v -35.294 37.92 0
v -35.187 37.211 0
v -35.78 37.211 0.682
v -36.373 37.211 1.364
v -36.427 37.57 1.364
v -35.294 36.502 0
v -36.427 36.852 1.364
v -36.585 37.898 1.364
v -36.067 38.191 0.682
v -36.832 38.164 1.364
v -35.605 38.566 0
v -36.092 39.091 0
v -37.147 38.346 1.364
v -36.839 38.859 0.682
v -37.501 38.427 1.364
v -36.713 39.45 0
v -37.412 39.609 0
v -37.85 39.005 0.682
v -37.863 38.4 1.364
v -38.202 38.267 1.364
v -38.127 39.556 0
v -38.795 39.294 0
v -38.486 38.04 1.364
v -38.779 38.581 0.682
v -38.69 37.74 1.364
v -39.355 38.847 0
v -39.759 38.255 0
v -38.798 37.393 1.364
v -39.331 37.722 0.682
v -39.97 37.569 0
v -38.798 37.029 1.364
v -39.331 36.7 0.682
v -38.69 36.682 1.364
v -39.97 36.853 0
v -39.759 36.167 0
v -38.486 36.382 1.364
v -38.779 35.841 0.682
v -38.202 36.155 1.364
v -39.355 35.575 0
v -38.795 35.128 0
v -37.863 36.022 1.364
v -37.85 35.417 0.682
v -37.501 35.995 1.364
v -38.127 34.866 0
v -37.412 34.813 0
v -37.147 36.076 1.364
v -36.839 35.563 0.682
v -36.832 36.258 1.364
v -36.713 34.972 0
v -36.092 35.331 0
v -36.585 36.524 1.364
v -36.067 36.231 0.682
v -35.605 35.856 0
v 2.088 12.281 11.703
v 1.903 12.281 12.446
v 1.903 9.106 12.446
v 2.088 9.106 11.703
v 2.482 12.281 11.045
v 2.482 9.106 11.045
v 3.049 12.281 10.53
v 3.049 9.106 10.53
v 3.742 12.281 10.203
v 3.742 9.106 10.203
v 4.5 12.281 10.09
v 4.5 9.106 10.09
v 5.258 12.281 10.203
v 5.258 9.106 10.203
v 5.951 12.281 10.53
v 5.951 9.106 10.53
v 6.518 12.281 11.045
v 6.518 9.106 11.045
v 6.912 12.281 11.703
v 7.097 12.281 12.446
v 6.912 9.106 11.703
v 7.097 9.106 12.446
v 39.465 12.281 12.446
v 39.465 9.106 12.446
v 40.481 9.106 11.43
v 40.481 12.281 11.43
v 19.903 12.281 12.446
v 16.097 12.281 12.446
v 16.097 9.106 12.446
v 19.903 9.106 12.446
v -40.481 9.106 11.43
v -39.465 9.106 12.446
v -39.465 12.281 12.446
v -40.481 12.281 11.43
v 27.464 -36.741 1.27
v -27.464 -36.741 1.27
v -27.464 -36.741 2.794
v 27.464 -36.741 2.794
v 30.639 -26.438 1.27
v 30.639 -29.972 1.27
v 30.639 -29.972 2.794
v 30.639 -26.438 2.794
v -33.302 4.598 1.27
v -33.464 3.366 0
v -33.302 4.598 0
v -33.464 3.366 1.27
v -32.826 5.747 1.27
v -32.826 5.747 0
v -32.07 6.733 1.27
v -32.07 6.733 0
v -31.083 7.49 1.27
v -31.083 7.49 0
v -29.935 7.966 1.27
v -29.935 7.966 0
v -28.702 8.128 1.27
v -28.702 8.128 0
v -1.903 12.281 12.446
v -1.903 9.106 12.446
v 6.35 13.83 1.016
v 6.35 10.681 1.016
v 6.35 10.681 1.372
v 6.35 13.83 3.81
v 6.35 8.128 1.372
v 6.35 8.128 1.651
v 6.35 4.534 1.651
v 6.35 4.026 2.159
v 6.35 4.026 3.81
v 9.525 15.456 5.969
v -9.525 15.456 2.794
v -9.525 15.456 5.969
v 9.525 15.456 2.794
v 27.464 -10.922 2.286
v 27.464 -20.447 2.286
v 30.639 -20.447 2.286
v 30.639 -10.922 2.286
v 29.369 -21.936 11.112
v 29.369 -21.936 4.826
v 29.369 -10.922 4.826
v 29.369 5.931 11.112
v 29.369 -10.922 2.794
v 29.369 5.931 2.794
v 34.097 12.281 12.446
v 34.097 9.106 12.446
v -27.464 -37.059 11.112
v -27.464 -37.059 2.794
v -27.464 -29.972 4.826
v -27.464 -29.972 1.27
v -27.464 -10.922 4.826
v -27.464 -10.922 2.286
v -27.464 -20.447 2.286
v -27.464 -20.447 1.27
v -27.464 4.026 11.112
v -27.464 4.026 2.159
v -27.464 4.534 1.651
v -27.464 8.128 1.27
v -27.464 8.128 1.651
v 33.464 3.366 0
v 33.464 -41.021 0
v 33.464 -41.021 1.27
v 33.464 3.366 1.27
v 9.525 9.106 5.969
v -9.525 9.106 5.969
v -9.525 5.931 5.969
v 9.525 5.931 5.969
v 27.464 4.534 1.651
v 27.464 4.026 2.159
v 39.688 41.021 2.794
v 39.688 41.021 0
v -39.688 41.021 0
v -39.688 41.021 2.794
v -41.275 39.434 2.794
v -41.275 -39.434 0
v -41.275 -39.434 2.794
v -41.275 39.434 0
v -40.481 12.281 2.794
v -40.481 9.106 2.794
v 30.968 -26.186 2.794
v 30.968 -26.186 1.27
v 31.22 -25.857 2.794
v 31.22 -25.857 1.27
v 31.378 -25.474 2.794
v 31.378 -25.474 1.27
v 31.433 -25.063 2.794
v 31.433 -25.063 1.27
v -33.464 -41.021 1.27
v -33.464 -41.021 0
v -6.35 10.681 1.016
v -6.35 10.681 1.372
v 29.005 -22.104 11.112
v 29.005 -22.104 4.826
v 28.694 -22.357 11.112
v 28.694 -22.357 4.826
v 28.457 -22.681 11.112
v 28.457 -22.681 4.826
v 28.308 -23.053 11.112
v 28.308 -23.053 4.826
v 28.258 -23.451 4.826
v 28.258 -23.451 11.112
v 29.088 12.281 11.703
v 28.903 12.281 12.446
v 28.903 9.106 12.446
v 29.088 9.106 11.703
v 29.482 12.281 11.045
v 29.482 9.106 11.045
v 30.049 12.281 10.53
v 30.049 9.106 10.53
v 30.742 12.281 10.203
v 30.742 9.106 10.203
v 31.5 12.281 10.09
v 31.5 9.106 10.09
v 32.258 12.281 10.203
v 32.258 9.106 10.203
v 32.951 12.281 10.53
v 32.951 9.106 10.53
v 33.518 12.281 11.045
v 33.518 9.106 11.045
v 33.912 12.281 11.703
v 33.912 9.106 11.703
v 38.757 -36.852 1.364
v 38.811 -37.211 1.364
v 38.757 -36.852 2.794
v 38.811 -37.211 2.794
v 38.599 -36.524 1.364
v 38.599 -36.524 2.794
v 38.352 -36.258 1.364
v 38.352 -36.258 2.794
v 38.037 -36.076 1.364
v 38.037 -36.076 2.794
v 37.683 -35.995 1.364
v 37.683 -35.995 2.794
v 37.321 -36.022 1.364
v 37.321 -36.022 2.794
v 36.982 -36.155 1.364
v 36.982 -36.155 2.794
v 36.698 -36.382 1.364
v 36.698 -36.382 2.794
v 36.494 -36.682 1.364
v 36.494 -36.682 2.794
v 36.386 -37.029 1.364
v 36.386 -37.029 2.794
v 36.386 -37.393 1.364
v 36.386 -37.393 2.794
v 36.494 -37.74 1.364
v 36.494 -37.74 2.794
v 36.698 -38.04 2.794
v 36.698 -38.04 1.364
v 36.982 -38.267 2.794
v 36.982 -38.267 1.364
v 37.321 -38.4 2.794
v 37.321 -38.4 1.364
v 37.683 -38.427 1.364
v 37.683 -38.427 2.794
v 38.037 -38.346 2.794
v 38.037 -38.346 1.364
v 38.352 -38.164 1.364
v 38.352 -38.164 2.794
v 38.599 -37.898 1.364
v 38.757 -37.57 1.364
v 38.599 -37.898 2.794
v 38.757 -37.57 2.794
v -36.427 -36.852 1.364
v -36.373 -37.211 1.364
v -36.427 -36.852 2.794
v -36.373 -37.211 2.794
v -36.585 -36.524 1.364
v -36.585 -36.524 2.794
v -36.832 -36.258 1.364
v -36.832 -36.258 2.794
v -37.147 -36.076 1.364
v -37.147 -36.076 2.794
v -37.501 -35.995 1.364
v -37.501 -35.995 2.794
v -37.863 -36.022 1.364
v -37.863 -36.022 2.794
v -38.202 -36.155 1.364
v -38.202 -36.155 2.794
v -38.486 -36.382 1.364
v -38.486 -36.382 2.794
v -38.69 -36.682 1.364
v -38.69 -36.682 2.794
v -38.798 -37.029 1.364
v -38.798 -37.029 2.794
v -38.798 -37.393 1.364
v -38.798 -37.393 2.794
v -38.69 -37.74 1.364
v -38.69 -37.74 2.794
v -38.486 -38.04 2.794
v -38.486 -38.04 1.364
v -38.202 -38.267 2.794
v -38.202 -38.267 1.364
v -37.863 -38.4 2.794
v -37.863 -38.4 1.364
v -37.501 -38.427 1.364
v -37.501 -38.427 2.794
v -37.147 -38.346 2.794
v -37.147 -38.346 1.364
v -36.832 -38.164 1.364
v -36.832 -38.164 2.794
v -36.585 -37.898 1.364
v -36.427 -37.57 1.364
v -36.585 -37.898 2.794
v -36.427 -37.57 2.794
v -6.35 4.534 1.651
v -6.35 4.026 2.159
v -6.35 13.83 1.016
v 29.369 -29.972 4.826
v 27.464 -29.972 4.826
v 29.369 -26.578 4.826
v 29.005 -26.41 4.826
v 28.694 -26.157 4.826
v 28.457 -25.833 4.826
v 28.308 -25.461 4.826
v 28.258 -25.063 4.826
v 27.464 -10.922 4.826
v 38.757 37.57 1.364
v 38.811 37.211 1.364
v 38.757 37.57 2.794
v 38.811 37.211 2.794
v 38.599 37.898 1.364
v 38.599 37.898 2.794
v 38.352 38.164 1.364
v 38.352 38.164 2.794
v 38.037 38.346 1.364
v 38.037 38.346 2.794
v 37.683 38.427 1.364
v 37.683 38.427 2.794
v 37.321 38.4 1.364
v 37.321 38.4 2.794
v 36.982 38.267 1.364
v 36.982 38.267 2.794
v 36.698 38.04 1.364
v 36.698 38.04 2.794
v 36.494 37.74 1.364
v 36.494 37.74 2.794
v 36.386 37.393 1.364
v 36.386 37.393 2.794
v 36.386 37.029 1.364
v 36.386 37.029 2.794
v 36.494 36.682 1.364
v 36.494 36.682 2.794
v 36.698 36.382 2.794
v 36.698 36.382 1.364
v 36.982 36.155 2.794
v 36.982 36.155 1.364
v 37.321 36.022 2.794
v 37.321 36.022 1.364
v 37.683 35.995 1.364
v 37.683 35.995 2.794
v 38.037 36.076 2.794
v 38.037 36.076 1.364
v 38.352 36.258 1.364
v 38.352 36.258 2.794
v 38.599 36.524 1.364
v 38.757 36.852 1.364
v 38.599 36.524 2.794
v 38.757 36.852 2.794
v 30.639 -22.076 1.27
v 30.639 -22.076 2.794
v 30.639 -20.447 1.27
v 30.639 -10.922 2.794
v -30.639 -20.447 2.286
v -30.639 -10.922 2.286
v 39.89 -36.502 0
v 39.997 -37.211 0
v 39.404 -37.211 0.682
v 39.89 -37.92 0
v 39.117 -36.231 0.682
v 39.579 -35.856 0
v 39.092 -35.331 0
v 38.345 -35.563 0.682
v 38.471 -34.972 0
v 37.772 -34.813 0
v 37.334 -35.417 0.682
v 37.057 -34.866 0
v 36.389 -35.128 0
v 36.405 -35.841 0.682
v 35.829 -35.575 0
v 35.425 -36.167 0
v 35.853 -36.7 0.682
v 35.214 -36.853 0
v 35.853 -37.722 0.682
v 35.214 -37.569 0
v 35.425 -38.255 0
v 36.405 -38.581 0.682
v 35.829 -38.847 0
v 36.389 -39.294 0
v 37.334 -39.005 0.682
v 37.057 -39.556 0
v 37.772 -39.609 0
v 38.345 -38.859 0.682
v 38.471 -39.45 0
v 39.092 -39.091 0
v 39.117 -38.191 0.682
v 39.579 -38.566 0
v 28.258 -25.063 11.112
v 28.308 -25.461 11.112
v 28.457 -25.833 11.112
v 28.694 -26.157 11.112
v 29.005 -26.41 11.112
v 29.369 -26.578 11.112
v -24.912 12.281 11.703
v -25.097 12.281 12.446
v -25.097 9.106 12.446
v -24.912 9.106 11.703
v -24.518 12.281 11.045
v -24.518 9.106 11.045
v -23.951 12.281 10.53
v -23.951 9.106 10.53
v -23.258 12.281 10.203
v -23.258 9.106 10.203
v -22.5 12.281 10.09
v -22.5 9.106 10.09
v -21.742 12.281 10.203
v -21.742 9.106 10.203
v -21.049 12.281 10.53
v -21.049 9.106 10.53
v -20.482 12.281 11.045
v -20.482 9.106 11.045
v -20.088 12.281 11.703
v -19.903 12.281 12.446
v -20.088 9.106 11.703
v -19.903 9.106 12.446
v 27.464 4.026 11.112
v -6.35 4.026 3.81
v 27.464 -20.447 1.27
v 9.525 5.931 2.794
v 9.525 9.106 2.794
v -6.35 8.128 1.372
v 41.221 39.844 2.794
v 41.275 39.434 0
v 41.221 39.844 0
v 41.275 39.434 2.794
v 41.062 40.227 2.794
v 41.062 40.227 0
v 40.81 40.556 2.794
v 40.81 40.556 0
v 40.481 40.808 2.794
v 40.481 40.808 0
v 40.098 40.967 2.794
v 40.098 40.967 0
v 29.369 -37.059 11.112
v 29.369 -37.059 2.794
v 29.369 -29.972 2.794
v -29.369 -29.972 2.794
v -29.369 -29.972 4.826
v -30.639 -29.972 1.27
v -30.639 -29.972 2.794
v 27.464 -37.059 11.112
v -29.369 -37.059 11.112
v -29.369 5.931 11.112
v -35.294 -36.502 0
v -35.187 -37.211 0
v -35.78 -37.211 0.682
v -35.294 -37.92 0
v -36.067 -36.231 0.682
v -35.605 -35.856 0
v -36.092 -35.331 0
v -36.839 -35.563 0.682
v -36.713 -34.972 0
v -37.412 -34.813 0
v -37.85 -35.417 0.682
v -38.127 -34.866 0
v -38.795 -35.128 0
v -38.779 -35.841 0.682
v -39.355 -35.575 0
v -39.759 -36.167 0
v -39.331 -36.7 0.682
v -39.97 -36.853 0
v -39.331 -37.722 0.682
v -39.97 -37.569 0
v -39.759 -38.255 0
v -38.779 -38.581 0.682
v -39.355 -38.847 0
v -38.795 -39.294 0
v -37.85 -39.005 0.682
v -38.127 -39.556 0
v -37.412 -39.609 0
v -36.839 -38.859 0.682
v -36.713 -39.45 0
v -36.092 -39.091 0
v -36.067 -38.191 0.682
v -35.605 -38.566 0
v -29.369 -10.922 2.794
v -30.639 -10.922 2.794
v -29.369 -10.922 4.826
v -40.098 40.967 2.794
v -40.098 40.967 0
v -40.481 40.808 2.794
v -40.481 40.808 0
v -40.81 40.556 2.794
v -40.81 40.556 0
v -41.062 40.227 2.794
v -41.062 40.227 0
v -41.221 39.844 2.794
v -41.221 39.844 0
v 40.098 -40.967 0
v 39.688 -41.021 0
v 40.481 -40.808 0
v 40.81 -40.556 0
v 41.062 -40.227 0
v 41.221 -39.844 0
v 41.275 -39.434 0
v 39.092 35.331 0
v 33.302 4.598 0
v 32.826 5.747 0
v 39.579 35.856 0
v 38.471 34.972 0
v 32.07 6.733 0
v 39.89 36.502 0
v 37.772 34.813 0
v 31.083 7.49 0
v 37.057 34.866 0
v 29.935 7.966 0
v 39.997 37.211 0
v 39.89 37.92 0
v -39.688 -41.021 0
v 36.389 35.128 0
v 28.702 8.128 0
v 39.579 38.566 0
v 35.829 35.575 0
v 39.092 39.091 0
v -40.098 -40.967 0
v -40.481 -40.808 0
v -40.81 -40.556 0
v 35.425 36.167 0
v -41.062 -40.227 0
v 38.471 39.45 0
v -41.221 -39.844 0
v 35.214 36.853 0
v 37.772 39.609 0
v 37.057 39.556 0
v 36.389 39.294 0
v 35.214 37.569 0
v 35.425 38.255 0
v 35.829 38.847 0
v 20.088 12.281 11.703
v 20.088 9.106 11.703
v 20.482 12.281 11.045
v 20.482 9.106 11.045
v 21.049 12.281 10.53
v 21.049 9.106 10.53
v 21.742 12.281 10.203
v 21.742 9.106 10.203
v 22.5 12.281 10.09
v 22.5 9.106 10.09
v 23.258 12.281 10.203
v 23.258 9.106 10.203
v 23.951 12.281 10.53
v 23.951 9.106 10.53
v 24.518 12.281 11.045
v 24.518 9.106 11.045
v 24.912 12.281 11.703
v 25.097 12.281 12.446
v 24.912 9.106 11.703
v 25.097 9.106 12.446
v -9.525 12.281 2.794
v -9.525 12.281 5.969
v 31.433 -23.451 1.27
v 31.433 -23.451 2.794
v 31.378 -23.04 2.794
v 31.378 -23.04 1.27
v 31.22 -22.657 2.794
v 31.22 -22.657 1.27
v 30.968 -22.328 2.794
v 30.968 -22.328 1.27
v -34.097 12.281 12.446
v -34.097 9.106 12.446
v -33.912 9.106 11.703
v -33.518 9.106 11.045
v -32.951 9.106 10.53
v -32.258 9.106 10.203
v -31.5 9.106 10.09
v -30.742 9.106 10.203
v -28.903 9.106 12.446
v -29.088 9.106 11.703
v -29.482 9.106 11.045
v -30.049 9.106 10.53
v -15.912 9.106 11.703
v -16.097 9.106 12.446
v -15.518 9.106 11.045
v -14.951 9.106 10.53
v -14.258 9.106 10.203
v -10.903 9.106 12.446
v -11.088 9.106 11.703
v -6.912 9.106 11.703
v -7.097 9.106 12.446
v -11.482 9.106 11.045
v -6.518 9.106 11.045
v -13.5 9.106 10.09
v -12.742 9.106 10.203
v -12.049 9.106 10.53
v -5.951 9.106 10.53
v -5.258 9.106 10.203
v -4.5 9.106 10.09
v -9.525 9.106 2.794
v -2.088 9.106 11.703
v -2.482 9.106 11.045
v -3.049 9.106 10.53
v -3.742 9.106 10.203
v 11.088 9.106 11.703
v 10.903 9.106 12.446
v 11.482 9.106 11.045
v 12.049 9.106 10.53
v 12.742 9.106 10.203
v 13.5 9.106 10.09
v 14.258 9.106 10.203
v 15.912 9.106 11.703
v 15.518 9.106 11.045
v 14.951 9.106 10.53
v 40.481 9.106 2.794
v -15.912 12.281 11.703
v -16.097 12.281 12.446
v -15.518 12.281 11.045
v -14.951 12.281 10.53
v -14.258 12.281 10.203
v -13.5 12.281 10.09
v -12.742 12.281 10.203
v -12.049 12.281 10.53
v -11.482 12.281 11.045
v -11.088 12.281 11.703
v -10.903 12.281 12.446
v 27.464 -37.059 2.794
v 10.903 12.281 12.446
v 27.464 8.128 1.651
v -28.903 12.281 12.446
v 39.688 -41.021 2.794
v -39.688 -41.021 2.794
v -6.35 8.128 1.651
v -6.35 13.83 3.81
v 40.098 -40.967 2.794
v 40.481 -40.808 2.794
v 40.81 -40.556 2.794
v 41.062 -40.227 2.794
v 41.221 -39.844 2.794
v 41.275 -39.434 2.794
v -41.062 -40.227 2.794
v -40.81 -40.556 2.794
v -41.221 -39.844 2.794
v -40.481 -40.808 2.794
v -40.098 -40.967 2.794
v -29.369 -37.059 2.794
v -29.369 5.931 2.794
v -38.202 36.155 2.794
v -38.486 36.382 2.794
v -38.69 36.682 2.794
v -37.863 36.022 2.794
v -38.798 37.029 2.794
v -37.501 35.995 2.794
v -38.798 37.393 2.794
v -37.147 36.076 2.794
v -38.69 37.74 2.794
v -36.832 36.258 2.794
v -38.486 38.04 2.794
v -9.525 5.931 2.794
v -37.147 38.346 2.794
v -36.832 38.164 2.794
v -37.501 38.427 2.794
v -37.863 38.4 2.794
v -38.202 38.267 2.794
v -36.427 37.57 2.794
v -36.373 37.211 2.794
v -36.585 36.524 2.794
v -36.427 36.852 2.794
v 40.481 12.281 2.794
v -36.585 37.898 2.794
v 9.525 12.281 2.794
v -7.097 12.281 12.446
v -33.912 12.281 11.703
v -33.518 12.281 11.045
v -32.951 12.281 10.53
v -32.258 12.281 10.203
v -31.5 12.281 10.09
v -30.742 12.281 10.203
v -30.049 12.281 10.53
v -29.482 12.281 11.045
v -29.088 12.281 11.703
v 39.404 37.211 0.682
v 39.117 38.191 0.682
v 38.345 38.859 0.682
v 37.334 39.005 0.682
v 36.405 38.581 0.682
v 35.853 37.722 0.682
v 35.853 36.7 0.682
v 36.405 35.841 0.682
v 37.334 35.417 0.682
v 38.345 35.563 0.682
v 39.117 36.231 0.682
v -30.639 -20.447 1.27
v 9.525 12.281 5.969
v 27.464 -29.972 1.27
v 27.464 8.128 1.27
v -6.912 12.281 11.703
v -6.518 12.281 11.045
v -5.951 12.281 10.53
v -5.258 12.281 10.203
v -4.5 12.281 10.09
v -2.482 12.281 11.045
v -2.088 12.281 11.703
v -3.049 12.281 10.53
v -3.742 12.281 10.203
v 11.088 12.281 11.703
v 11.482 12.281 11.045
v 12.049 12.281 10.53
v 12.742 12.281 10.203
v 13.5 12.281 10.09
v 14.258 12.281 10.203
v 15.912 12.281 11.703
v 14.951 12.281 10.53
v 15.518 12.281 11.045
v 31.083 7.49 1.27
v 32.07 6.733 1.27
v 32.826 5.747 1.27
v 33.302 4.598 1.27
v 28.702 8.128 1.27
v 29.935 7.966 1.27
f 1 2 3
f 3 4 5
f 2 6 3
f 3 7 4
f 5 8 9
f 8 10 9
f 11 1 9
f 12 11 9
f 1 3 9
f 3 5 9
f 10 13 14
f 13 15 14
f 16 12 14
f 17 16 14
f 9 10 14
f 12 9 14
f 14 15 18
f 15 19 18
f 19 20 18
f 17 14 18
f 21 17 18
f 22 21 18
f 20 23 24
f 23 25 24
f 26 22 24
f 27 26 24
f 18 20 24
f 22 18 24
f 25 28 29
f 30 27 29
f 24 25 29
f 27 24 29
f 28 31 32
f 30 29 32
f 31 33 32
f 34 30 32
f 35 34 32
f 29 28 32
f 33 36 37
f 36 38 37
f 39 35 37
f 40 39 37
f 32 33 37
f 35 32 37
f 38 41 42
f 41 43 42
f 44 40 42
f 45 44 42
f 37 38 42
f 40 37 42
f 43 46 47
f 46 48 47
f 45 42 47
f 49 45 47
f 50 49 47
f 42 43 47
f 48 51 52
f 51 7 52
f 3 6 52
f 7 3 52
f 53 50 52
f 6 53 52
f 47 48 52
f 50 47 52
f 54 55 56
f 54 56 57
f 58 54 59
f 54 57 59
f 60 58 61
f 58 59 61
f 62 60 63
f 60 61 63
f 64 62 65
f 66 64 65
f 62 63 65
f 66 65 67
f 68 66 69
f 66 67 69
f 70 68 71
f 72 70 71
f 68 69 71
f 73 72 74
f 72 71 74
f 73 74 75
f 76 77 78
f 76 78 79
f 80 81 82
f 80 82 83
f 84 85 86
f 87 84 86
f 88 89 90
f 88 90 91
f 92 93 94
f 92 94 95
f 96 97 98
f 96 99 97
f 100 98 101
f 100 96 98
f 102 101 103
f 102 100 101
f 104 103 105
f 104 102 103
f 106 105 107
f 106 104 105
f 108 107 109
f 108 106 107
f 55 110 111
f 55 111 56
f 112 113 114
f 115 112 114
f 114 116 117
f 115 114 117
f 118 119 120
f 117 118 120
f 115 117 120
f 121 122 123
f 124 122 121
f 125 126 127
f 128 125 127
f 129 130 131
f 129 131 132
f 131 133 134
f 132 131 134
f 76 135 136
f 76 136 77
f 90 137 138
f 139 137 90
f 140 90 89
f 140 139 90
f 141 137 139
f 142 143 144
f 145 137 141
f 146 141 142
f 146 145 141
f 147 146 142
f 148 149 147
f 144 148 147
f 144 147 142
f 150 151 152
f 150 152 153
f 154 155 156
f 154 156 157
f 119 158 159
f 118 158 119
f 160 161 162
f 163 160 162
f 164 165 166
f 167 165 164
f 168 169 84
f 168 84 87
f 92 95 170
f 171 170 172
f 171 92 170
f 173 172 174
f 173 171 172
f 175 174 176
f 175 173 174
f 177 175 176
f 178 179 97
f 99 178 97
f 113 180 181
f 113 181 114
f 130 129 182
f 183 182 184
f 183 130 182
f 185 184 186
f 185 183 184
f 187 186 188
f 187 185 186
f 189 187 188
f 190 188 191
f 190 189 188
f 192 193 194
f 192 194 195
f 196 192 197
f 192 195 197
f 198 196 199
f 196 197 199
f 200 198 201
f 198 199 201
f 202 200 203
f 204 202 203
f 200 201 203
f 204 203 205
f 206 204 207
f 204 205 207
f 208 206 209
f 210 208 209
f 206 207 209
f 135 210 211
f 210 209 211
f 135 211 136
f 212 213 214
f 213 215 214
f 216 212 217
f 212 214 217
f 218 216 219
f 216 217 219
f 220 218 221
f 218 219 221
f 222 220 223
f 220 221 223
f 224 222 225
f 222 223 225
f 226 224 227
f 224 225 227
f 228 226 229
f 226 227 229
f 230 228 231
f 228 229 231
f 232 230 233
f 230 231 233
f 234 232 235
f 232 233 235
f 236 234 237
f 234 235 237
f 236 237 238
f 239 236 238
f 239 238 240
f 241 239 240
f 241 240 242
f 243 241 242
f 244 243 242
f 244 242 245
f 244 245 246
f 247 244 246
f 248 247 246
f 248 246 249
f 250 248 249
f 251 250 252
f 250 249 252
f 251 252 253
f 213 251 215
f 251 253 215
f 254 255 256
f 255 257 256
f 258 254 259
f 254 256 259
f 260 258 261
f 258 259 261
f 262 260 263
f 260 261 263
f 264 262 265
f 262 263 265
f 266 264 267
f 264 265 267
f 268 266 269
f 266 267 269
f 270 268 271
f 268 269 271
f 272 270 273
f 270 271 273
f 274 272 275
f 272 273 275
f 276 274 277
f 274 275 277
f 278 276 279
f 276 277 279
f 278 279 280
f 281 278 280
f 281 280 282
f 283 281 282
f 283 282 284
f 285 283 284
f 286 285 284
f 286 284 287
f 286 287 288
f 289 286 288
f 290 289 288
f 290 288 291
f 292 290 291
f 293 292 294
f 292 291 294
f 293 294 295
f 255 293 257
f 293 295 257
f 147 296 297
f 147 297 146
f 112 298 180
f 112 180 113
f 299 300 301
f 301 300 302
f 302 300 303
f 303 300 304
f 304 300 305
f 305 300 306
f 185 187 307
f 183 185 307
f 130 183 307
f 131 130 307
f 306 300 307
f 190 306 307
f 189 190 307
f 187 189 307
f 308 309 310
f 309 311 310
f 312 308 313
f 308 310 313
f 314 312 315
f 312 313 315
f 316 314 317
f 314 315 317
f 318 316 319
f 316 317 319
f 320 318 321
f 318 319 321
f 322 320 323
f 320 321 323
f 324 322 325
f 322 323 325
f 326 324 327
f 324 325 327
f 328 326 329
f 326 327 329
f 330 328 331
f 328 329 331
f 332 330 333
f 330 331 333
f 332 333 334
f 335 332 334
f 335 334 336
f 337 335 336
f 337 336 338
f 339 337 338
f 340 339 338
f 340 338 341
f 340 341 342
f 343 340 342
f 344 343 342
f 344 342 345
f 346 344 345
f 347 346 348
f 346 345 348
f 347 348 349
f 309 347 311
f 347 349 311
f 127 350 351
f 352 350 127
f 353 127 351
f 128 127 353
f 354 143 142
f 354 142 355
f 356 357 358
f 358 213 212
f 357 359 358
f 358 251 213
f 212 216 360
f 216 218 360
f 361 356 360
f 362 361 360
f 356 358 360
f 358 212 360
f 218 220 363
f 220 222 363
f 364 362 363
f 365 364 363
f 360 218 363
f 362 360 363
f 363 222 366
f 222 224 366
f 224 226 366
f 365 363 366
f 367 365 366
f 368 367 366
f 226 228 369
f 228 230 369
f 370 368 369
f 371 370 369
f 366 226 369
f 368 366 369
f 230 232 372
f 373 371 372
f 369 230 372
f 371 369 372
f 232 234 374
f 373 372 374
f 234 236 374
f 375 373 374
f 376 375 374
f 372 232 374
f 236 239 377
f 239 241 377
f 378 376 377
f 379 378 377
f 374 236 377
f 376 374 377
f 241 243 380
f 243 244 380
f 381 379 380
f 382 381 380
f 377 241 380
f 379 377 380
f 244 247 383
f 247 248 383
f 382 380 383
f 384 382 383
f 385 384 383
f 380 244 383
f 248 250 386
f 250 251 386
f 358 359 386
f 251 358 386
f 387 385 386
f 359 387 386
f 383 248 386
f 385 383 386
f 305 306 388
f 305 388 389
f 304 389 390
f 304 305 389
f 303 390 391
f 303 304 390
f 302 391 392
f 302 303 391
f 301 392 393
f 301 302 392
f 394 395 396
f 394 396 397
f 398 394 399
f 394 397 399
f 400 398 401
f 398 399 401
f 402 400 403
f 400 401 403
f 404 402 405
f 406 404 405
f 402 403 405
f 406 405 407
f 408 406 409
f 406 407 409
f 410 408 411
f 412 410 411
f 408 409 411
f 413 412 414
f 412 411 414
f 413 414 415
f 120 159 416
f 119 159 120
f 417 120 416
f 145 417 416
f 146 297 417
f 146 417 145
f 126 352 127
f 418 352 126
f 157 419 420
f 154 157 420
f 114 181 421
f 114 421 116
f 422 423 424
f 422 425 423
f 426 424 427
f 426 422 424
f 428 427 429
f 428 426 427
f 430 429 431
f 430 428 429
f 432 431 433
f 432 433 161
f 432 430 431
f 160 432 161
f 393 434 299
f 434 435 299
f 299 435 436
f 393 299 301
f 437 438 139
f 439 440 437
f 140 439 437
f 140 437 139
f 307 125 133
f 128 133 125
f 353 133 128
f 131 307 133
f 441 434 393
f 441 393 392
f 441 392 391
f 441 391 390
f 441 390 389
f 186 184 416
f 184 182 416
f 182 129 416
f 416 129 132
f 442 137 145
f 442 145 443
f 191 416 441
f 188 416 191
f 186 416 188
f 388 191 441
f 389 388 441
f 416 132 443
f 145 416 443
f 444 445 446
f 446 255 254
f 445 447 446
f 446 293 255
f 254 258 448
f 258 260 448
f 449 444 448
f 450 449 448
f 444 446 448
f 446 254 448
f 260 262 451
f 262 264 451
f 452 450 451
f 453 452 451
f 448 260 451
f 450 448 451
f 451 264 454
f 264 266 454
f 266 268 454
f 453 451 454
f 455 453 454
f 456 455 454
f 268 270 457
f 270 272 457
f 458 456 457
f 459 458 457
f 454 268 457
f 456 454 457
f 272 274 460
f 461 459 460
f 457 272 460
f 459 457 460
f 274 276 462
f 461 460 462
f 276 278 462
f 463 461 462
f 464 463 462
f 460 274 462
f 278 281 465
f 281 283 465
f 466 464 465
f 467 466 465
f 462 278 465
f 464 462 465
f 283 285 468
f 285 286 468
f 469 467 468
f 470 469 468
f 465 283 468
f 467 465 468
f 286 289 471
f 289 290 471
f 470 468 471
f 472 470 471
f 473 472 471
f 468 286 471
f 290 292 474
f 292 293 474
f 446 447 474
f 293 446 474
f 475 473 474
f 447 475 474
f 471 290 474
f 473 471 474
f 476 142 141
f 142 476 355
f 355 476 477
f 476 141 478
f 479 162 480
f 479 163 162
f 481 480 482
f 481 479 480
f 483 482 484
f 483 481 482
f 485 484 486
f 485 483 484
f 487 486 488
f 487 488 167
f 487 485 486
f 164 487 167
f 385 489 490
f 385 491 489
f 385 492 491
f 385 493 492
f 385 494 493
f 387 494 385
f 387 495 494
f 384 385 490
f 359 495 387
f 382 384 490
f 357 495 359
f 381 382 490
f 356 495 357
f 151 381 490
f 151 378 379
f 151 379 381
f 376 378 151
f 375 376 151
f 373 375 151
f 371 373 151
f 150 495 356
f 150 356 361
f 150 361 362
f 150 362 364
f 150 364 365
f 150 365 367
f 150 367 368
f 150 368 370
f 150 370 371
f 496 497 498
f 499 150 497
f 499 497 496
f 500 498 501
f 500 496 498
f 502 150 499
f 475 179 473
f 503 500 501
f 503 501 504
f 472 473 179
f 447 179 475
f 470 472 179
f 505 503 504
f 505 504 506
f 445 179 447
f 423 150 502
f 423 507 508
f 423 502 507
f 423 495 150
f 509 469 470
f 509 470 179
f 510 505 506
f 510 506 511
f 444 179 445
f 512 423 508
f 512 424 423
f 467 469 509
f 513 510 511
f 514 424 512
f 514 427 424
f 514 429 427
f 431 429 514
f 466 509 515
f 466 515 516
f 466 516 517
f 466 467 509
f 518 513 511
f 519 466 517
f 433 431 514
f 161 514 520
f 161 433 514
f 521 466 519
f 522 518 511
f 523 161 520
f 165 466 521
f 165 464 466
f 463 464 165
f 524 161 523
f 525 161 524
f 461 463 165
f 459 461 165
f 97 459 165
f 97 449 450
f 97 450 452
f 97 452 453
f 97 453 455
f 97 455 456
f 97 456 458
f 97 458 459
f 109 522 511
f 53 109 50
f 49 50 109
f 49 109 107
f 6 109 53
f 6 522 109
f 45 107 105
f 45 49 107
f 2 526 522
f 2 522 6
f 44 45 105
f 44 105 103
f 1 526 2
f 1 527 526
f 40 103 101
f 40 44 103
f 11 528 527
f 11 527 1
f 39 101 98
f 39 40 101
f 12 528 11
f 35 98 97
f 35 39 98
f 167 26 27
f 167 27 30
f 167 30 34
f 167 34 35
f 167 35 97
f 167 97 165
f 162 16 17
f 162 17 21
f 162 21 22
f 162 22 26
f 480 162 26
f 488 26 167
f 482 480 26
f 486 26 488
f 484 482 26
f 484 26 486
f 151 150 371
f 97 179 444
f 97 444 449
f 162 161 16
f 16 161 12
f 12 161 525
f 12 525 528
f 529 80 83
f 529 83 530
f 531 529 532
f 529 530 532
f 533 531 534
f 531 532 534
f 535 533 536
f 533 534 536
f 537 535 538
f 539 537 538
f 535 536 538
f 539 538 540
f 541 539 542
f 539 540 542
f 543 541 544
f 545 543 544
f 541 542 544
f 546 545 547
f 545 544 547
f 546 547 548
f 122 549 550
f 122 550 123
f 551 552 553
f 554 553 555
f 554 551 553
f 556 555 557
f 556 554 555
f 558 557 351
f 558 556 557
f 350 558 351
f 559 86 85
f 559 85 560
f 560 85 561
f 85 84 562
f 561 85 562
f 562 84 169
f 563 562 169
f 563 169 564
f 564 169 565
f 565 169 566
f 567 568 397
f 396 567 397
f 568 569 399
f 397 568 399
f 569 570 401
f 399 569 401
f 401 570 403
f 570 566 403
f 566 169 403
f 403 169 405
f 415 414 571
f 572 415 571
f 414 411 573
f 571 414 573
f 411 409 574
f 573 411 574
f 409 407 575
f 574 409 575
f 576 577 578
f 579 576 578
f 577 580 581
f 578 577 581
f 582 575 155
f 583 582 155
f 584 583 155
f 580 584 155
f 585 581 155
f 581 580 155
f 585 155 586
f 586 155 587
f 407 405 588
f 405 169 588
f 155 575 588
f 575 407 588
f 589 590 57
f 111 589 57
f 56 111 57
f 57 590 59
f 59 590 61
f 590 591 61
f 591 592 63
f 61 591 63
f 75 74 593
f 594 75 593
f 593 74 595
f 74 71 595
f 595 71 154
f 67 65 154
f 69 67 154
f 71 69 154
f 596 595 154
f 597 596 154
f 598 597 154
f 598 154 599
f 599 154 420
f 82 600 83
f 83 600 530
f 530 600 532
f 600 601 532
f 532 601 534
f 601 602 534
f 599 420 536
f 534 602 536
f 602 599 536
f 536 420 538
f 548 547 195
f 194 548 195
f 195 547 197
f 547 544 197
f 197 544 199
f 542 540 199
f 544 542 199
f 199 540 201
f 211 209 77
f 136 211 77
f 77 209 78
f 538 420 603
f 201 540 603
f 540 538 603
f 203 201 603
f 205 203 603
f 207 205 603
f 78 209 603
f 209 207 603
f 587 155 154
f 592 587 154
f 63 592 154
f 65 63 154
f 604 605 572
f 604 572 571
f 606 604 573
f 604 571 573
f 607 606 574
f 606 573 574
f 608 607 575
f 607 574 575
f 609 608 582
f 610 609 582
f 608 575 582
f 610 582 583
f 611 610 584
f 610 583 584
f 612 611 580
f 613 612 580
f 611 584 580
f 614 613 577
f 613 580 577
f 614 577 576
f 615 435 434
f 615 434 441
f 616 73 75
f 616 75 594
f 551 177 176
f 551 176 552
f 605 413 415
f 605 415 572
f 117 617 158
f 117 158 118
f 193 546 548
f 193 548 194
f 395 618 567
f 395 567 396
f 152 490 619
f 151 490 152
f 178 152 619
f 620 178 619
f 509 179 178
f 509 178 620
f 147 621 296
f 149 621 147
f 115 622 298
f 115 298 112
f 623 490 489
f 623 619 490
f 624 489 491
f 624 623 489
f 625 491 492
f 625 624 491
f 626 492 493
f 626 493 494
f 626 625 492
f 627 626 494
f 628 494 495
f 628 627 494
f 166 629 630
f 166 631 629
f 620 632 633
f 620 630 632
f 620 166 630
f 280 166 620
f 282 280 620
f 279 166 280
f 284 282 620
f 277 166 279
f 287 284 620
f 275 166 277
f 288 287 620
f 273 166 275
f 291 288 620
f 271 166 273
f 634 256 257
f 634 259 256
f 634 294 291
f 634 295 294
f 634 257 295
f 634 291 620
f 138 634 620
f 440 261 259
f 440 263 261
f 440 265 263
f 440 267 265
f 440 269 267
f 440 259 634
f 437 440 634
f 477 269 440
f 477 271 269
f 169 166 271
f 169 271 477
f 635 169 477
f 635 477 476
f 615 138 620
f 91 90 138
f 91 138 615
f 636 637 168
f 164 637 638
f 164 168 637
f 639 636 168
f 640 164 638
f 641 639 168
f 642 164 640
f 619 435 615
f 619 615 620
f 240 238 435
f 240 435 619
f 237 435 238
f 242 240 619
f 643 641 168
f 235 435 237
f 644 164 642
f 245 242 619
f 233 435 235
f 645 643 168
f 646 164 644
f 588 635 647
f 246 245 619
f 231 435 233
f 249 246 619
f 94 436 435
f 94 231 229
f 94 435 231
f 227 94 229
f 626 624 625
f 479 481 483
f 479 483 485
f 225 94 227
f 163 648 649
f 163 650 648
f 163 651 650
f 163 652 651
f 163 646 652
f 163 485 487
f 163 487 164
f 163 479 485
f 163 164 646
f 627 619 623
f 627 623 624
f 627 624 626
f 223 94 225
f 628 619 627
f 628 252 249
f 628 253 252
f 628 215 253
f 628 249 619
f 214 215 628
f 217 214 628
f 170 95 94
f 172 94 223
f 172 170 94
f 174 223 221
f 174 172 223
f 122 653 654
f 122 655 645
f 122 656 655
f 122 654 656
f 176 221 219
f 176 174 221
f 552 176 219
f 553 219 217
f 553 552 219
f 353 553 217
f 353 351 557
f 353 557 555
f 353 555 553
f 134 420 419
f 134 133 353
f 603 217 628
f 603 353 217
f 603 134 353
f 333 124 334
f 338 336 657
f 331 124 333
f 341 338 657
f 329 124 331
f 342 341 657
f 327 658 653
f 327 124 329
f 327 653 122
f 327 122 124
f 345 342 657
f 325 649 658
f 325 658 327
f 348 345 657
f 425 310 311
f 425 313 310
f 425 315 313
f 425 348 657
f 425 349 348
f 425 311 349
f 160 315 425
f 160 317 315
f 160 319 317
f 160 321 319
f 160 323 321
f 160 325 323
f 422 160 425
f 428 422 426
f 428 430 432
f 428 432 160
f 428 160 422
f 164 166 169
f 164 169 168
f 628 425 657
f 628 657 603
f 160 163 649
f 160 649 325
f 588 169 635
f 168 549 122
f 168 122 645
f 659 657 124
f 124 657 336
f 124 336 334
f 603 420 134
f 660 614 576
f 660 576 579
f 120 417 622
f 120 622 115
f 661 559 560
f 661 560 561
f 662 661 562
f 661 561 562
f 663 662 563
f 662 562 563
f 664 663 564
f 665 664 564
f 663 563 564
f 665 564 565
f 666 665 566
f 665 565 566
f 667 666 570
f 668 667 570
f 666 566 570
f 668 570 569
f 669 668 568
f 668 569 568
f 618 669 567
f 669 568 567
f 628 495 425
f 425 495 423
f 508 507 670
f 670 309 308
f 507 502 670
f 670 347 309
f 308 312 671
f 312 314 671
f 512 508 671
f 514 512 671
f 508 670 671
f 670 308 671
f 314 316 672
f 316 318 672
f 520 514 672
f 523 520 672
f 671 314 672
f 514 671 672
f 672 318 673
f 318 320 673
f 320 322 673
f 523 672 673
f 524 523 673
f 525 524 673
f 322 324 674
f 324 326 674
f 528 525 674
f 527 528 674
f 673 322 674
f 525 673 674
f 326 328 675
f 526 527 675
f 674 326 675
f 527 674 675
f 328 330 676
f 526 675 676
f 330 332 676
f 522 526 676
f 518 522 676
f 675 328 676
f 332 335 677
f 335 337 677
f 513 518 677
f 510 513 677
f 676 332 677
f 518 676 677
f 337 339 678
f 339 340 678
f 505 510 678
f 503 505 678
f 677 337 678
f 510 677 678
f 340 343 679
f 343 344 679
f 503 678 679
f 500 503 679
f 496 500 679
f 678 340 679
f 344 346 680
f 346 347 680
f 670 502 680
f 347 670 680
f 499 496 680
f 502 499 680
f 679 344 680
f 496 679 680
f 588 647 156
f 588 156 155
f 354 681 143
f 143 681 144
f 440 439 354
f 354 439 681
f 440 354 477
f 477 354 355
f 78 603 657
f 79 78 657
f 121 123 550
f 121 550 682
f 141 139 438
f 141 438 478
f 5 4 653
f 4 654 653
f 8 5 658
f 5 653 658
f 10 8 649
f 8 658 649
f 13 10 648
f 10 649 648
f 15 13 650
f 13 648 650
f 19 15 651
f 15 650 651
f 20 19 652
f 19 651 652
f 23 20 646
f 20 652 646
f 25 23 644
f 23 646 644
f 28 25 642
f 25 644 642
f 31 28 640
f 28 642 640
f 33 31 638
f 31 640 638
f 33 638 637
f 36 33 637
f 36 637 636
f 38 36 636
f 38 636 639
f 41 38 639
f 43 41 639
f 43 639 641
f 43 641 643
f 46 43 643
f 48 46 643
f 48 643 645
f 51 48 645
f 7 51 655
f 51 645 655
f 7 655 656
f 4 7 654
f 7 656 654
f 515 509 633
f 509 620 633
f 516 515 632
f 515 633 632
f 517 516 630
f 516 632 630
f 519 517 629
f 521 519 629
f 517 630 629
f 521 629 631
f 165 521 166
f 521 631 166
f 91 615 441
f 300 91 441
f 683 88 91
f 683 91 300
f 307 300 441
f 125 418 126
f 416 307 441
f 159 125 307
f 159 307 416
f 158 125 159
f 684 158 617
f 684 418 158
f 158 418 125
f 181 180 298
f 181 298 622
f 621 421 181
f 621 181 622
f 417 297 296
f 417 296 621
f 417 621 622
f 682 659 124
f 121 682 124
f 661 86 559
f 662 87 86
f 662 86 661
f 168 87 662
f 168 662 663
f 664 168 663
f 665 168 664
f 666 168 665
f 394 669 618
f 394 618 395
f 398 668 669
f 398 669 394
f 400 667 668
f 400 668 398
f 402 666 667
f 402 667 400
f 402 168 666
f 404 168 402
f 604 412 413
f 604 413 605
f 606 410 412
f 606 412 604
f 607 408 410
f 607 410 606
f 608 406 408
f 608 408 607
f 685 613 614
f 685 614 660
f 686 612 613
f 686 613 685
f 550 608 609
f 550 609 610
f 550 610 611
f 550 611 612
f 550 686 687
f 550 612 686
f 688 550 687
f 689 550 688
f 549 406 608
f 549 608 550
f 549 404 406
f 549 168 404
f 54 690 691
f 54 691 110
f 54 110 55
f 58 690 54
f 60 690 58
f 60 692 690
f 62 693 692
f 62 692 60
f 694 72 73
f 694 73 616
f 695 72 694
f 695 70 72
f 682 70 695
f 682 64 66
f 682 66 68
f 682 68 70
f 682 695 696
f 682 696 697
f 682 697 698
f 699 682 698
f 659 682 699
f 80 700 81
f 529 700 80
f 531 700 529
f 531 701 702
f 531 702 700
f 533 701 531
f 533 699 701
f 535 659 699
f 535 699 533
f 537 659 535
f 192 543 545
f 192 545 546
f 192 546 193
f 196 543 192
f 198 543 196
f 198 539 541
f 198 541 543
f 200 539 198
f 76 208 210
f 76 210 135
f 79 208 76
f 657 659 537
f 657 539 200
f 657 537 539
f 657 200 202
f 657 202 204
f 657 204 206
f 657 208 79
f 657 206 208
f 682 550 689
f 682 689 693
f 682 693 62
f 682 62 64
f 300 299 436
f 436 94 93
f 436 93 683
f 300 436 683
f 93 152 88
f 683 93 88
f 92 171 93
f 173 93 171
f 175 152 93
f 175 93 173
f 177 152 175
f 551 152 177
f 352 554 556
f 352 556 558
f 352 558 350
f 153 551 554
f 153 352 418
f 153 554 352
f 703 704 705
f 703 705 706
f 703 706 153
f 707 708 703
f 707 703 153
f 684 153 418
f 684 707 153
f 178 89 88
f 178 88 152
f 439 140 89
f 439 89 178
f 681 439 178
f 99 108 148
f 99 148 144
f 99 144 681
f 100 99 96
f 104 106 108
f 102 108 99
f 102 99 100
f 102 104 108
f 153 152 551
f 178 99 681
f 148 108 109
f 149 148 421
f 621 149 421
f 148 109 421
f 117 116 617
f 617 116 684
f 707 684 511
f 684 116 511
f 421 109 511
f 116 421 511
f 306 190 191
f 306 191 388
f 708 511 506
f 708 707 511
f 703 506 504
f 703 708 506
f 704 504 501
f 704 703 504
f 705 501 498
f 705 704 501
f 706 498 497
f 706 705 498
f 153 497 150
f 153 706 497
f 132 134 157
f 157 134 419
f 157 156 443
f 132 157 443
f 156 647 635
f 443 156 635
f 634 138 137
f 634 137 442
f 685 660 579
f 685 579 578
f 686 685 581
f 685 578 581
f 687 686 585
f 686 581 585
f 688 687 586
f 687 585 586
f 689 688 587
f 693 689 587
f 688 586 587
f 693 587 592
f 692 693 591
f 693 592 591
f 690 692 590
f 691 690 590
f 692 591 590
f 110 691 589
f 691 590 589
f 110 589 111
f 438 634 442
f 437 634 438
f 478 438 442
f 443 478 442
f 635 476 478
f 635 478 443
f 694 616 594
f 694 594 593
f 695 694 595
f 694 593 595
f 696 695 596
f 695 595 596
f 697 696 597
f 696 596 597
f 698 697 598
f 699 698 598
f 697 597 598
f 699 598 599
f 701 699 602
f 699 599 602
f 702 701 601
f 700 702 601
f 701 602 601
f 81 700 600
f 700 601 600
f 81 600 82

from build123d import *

# Parameters (mm, degrees)
SKETCH1_W                                      = 83.058
SKETCH1_H                                      = 82.55
BOSS_EXTRUDE1_DEPTH                            = 2.794
SKETCH2_W                                      = 58.7375
SKETCH2_H                                      = 42.9895
SKETCH2_W_2                                    = 54.9275
SKETCH2_H_2                                    = 39.1795
BOSS_EXTRUDE2_DEPTH                            = 11.1125
SKETCH5_W                                      = 66.929
SKETCH5_H                                      = 49.403
CUT_EXTRUDE1_DEPTH                             = 1.27
SKETCH2_2_W                                    = 54.9275
SKETCH2_2_H                                    = 39.1795
CUT_EXTRUDE2_DEPTH                             = 60.596737513
CSK_FOR_2_FLAT_HEAD_MACHINE_SCREW1_D           = 2.4384
CSK_FOR_2_FLAT_HEAD_MACHINE_SCREW1_CSINK_D     = 4.8104044
CSK_FOR_2_FLAT_HEAD_MACHINE_SCREW1_CSINK_ANGLE = 82
SKETCH9_W                                      = 12.7
SKETCH9_H                                      = 2.54
CUT_EXTRUDE4_DEPTH                             = 9.8044
SKETCH10_W                                     = 12.7
SKETCH10_H                                     = 3.048
CUT_EXTRUDE5_DEPTH                             = 0.254
SKETCH11_W                                     = 3.175
SKETCH11_H                                     = 9.525
CUT_EXTRUDE7_DEPTH                             = 1.524
SKETCH12_W                                     = 2.032
SKETCH12_H                                     = 19.05
CUT_EXTRUDE8_DEPTH                             = 82.161030266
SKETCH14_W                                     = 3.175
SKETCH14_H                                     = 19.05
CUT_EXTRUDE11_DEPTH                            = 0.508
FILLET2_R                                      = 4.7625
SKETCH15_W                                     = 54.9275
SKETCH15_H                                     = 1.905
CUT_EXTRUDE12_DEPTH                            = 8.3185
SKETCH16_W                                     = 54.9275
SKETCH16_H                                     = 1.524
CUT_EXTRUDE13_DEPTH                            = 1.5875
SKETCH17_W                                     = 12.7
SKETCH17_H                                     = 2.6543
BOSS_EXTRUDE3_DEPTH                            = 0.1016
SKETCH18_W                                     = 12.7
SKETCH18_H                                     = 0.3556
CUT_EXTRUDE14_DEPTH                            = 0.1016
SKETCH19_W                                     = 161.493776118
SKETCH19_H                                     = 133.946930056
SKETCH19_W_2                                   = 82.55
SKETCH19_H_2                                   = 82.042
CUT_EXTRUDE15_DEPTH                            = 60.596737513
FILLET3_R                                      = 1.5875
SKETCH21_W                                     = 80.9625
SKETCH21_H                                     = 3.175
BOSS_EXTRUDE4_DEPTH                            = 9.906
SKETCH22_W                                     = 19.05
SKETCH22_H                                     = 9.525
BOSS_EXTRUDE5_DEPTH                            = 3.175
SKETCH23_W                                     = 12.7
SKETCH23_H                                     = 1.016
CUT_EXTRUDE16_DEPTH                            = 7.8994
SKETCH24_R                                     = 2.60985
CUT_EXTRUDE17_DEPTH                            = 67.163598214
SKETCH25_W                                     = 80.9625
SKETCH25_H                                     = 3.175
CUT_EXTRUDE18_DEPTH                            = 0.254
CHAMFER1_SIZE                                  = 1.016
CUT_EXTRUDE19_DEPTH                            = 60.255810196
SKETCH29_W                                     = 54.9275
SKETCH29_H                                     = 4.1021
CUT_EXTRUDE20_DEPTH                            = 0.381
CHAMFER2_SIZE                                  = 0.508


with BuildPart() as part:
    # Sketch1 → Boss-Extrude1 (new body)
    with BuildSketch(Plane.XY):
        Rectangle(SKETCH1_W, SKETCH1_H)
    extrude(amount=BOSS_EXTRUDE1_DEPTH)

    # Sketch2 → Boss-Extrude2 (add)
    with BuildSketch(Plane(origin=(0, 0, 0), x_dir=(-1, 0, 0), z_dir=(0, 0, -1))):
        with Locations((0, -15.56385)):
            Rectangle(SKETCH2_W, SKETCH2_H)
        with Locations((0, -15.56385)):
            Rectangle(SKETCH2_W_2, SKETCH2_H_2, mode=Mode.SUBTRACT)
    extrude(amount=-BOSS_EXTRUDE2_DEPTH)

    # Sketch5 → Cut-Extrude1 (cut)
    with BuildSketch(Plane(origin=(0, 0, 0), x_dir=(-1, 0, 0), z_dir=(0, 0, -1))):
        with Locations((0, -16.5735)):
            Rectangle(SKETCH5_W, SKETCH5_H)
    extrude(amount=-CUT_EXTRUDE1_DEPTH, mode=Mode.SUBTRACT)

    # Sketch2<2> → Cut-Extrude2 (cut, through all)
    with BuildSketch(Plane(origin=(0, 0, 0), x_dir=(-1, 0, 0), z_dir=(0, 0, -1))):
        with Locations((0, -15.56385)):
            Rectangle(SKETCH2_2_W, SKETCH2_2_H)
    extrude(amount=-CUT_EXTRUDE2_DEPTH, mode=Mode.SUBTRACT)

    # CSK for #2 Flat Head Machine Screw1 (through all)
    with Locations(Plane(origin=(0, 0, 0), x_dir=(-1, 0, 0), z_dir=(0, 0, -1))):
        with Locations((37.592, 37.211), (-37.592, 37.211), (-37.592, -37.211), (37.592, -37.211)):
            CounterSinkHole(CSK_FOR_2_FLAT_HEAD_MACHINE_SCREW1_D / 2, CSK_FOR_2_FLAT_HEAD_MACHINE_SCREW1_CSINK_D / 2, counter_sink_angle=CSK_FOR_2_FLAT_HEAD_MACHINE_SCREW1_CSINK_ANGLE)

    # Sketch9 → Cut-Extrude4 (cut)
    with BuildSketch(Plane.XZ.offset(-4.0259)):
        with Locations((0, 2.54)):
            Rectangle(SKETCH9_W, SKETCH9_H)
    extrude(amount=-CUT_EXTRUDE4_DEPTH, mode=Mode.SUBTRACT)

    # Sketch10 → Cut-Extrude5 (cut)
    with BuildSketch(Plane.XY.offset(1.27)):
        with Locations((0, 12.3063)):
            Rectangle(SKETCH10_W, SKETCH10_H)
    extrude(amount=-CUT_EXTRUDE5_DEPTH, mode=Mode.SUBTRACT)

    # Sketch11 → Cut-Extrude7 (cut)
    with BuildSketch(Plane(origin=(0, 0, 1.27), x_dir=(-1, 0, 0), z_dir=(0, 0, -1))):
        with Locations((-29.05125, -25.2095)):
            Rectangle(SKETCH11_W, SKETCH11_H)
    cut_extrude7 = extrude(amount=-CUT_EXTRUDE7_DEPTH, mode=Mode.SUBTRACT)

    # Sketch12 → Cut-Extrude8 (cut, through all)
    with BuildSketch(Plane.ZY.offset(-27.46375)):
        with Locations((3.81, -20.447)):
            Rectangle(SKETCH12_W, SKETCH12_H)
    cut_extrude8 = extrude(amount=-CUT_EXTRUDE8_DEPTH, mode=Mode.SUBTRACT)

    # Sketch14 → Cut-Extrude11 (cut)
    with BuildSketch(Plane.XY.offset(2.794)):
        with Locations((29.05125, -20.447)):
            Rectangle(SKETCH14_W, SKETCH14_H)
    cut_extrude11 = extrude(amount=-CUT_EXTRUDE11_DEPTH, mode=Mode.SUBTRACT)

    # Mirror1: Cut-Extrude7, Cut-Extrude8, Cut-Extrude11 across plane
    add(cut_extrude7.mirror(Plane(origin=(0, 0, 0), x_dir=(0, 0, 1), z_dir=(1, 0, 0))), mode=Mode.SUBTRACT)
    add(cut_extrude8.mirror(Plane(origin=(0, 0, 0), x_dir=(0, 0, 1), z_dir=(1, 0, 0))), mode=Mode.SUBTRACT)
    add(cut_extrude11.mirror(Plane(origin=(0, 0, 0), x_dir=(0, 0, 1), z_dir=(1, 0, 0))), mode=Mode.SUBTRACT)

    # Fillet2
    fillet2_edges = [part.edges().sort_by_distance(p)[0] for p in [
        (-33.4645, 8.128, 0.635),
        (33.4645, 8.128, 0.635),
    ]]
    fillet(fillet2_edges, radius=FILLET2_R)

    # Sketch15 → Cut-Extrude12 (cut)
    with BuildSketch(Plane.XY.offset(11.1125)):
        with Locations((0, -36.1061)):
            Rectangle(SKETCH15_W, SKETCH15_H)
    extrude(amount=-CUT_EXTRUDE12_DEPTH, mode=Mode.SUBTRACT)

    # Sketch16 → Cut-Extrude13 (cut)
    with BuildSketch(Plane(origin=(0, -35.1536, 0), x_dir=(1, 0, 0), z_dir=(0, 1, 0))):
        with Locations((0, -2.032)):
            Rectangle(SKETCH16_W, SKETCH16_H)
    extrude(amount=-CUT_EXTRUDE13_DEPTH, mode=Mode.SUBTRACT)

    # Sketch17 → Boss-Extrude3 (add)
    with BuildSketch(Plane.XY.offset(1.27)):
        with Locations((0, 9.45515)):
            Rectangle(SKETCH17_W, SKETCH17_H)
    extrude(amount=BOSS_EXTRUDE3_DEPTH)

    # Sketch18 → Cut-Extrude14 (cut)
    with BuildSketch(Plane(origin=(0, 10.7823, 0), x_dir=(1, 0, 0), z_dir=(0, 1, 0))):
        with Locations((0, -1.1938)):
            Rectangle(SKETCH18_W, SKETCH18_H)
    extrude(amount=-CUT_EXTRUDE14_DEPTH, mode=Mode.SUBTRACT)

    # Sketch19 → Cut-Extrude15 (cut, through all)
    with BuildSketch(Plane(origin=(0, 0, 0), x_dir=(-1, 0, 0), z_dir=(0, 0, -1))):
        Rectangle(SKETCH19_W, SKETCH19_H)
        Rectangle(SKETCH19_W_2, SKETCH19_H_2, mode=Mode.SUBTRACT)
    extrude(amount=-CUT_EXTRUDE15_DEPTH, mode=Mode.SUBTRACT)

    # Fillet3
    fillet3_edges = [part.edges().sort_by_distance(p)[0] for p in [
        (41.275, 41.021, 1.397),
        (-41.275, 41.021, 1.397),
        (-41.275, -41.021, 1.397),
        (41.275, -41.021, 1.397),
    ]]
    fillet(fillet3_edges, radius=FILLET3_R)

    # Sketch21 → Boss-Extrude4 (add)
    with BuildSketch(Plane.XY.offset(2.794)):
        with Locations((0, 10.6934)):
            Rectangle(SKETCH21_W, SKETCH21_H)
    extrude(amount=BOSS_EXTRUDE4_DEPTH)

    # Sketch22 → Boss-Extrude5 (add)
    with BuildSketch(Plane.XY.offset(2.794)):
        with Locations((0, 10.6934)):
            Rectangle(SKETCH22_W, SKETCH22_H)
    extrude(amount=BOSS_EXTRUDE5_DEPTH)

    # Sketch23 → Cut-Extrude16 (cut)
    with BuildSketch(Plane.XZ.offset(-5.9309)):
        with Locations((0, 3.302)):
            Rectangle(SKETCH23_W, SKETCH23_H)
    extrude(amount=-CUT_EXTRUDE16_DEPTH, mode=Mode.SUBTRACT)

    # Sketch24 → Cut-Extrude17 (cut, through all)
    with BuildSketch(Plane.XZ.offset(-9.1059)):
        with Locations((-31.5, 12.7)):
            Circle(SKETCH24_R)
        with Locations((-22.5, 12.7)):
            Circle(SKETCH24_R)
        with Locations((31.5, 12.7)):
            Circle(SKETCH24_R)
        with Locations((22.5, 12.7)):
            Circle(SKETCH24_R)
        with Locations((13.5, 12.7)):
            Circle(SKETCH24_R)
        with Locations((4.5, 12.7)):
            Circle(SKETCH24_R)
        with Locations((-4.5, 12.7)):
            Circle(SKETCH24_R)
        with Locations((-13.5, 12.7)):
            Circle(SKETCH24_R)
    extrude(amount=-CUT_EXTRUDE17_DEPTH, mode=Mode.SUBTRACT)

    # Sketch25 → Cut-Extrude18 (cut)
    with BuildSketch(Plane.XY.offset(12.7)):
        with Locations((0, 10.6934)):
            Rectangle(SKETCH25_W, SKETCH25_H)
    extrude(amount=-CUT_EXTRUDE18_DEPTH, mode=Mode.SUBTRACT)

    # Chamfer1
    chamfer1_edges = [part.edges().sort_by_distance(p)[0] for p in [
        (-40.48125, 10.6934, 12.446),
        (40.48125, 10.6934, 12.446),
    ]]
    chamfer(chamfer1_edges, length=CHAMFER1_SIZE)

    # Sketch26 → Cut-Extrude19 (cut, through all)
    with BuildSketch(Plane(origin=(0, 0, 1.27), x_dir=(-1, 0, 0), z_dir=(0, 0, -1))):
        with BuildLine():
            Line((-28.2575, -23.45055), (-28.2575, -25.06345))
            ThreePointArc((-28.2575, -25.06345), (-29.845, -26.65095), (-31.4325, -25.06345))
            Line((-31.4325, -25.06345), (-31.4325, -23.45055))
            ThreePointArc((-31.4325, -23.45055), (-29.845, -21.86305), (-28.2575, -23.45055))
        make_face()
    extrude(amount=-CUT_EXTRUDE19_DEPTH, mode=Mode.SUBTRACT)

    # Sketch29 → Cut-Extrude20 (cut)
    with BuildSketch(Plane(origin=(0, 0, 1.27), x_dir=(-1, 0, 0), z_dir=(0, 0, -1))):
        with Locations((0, 6.07695)):
            Rectangle(SKETCH29_W, SKETCH29_H)
    extrude(amount=-CUT_EXTRUDE20_DEPTH, mode=Mode.SUBTRACT)

    # Chamfer2
    chamfer2_edges = [part.edges().sort_by_distance(p)[0] for p in [
        (-16.906875, 4.0259, 1.651),
        (16.906875, 4.0259, 1.651),
    ]]
    chamfer(chamfer2_edges, length=CHAMFER2_SIZE)


solid = part.part
